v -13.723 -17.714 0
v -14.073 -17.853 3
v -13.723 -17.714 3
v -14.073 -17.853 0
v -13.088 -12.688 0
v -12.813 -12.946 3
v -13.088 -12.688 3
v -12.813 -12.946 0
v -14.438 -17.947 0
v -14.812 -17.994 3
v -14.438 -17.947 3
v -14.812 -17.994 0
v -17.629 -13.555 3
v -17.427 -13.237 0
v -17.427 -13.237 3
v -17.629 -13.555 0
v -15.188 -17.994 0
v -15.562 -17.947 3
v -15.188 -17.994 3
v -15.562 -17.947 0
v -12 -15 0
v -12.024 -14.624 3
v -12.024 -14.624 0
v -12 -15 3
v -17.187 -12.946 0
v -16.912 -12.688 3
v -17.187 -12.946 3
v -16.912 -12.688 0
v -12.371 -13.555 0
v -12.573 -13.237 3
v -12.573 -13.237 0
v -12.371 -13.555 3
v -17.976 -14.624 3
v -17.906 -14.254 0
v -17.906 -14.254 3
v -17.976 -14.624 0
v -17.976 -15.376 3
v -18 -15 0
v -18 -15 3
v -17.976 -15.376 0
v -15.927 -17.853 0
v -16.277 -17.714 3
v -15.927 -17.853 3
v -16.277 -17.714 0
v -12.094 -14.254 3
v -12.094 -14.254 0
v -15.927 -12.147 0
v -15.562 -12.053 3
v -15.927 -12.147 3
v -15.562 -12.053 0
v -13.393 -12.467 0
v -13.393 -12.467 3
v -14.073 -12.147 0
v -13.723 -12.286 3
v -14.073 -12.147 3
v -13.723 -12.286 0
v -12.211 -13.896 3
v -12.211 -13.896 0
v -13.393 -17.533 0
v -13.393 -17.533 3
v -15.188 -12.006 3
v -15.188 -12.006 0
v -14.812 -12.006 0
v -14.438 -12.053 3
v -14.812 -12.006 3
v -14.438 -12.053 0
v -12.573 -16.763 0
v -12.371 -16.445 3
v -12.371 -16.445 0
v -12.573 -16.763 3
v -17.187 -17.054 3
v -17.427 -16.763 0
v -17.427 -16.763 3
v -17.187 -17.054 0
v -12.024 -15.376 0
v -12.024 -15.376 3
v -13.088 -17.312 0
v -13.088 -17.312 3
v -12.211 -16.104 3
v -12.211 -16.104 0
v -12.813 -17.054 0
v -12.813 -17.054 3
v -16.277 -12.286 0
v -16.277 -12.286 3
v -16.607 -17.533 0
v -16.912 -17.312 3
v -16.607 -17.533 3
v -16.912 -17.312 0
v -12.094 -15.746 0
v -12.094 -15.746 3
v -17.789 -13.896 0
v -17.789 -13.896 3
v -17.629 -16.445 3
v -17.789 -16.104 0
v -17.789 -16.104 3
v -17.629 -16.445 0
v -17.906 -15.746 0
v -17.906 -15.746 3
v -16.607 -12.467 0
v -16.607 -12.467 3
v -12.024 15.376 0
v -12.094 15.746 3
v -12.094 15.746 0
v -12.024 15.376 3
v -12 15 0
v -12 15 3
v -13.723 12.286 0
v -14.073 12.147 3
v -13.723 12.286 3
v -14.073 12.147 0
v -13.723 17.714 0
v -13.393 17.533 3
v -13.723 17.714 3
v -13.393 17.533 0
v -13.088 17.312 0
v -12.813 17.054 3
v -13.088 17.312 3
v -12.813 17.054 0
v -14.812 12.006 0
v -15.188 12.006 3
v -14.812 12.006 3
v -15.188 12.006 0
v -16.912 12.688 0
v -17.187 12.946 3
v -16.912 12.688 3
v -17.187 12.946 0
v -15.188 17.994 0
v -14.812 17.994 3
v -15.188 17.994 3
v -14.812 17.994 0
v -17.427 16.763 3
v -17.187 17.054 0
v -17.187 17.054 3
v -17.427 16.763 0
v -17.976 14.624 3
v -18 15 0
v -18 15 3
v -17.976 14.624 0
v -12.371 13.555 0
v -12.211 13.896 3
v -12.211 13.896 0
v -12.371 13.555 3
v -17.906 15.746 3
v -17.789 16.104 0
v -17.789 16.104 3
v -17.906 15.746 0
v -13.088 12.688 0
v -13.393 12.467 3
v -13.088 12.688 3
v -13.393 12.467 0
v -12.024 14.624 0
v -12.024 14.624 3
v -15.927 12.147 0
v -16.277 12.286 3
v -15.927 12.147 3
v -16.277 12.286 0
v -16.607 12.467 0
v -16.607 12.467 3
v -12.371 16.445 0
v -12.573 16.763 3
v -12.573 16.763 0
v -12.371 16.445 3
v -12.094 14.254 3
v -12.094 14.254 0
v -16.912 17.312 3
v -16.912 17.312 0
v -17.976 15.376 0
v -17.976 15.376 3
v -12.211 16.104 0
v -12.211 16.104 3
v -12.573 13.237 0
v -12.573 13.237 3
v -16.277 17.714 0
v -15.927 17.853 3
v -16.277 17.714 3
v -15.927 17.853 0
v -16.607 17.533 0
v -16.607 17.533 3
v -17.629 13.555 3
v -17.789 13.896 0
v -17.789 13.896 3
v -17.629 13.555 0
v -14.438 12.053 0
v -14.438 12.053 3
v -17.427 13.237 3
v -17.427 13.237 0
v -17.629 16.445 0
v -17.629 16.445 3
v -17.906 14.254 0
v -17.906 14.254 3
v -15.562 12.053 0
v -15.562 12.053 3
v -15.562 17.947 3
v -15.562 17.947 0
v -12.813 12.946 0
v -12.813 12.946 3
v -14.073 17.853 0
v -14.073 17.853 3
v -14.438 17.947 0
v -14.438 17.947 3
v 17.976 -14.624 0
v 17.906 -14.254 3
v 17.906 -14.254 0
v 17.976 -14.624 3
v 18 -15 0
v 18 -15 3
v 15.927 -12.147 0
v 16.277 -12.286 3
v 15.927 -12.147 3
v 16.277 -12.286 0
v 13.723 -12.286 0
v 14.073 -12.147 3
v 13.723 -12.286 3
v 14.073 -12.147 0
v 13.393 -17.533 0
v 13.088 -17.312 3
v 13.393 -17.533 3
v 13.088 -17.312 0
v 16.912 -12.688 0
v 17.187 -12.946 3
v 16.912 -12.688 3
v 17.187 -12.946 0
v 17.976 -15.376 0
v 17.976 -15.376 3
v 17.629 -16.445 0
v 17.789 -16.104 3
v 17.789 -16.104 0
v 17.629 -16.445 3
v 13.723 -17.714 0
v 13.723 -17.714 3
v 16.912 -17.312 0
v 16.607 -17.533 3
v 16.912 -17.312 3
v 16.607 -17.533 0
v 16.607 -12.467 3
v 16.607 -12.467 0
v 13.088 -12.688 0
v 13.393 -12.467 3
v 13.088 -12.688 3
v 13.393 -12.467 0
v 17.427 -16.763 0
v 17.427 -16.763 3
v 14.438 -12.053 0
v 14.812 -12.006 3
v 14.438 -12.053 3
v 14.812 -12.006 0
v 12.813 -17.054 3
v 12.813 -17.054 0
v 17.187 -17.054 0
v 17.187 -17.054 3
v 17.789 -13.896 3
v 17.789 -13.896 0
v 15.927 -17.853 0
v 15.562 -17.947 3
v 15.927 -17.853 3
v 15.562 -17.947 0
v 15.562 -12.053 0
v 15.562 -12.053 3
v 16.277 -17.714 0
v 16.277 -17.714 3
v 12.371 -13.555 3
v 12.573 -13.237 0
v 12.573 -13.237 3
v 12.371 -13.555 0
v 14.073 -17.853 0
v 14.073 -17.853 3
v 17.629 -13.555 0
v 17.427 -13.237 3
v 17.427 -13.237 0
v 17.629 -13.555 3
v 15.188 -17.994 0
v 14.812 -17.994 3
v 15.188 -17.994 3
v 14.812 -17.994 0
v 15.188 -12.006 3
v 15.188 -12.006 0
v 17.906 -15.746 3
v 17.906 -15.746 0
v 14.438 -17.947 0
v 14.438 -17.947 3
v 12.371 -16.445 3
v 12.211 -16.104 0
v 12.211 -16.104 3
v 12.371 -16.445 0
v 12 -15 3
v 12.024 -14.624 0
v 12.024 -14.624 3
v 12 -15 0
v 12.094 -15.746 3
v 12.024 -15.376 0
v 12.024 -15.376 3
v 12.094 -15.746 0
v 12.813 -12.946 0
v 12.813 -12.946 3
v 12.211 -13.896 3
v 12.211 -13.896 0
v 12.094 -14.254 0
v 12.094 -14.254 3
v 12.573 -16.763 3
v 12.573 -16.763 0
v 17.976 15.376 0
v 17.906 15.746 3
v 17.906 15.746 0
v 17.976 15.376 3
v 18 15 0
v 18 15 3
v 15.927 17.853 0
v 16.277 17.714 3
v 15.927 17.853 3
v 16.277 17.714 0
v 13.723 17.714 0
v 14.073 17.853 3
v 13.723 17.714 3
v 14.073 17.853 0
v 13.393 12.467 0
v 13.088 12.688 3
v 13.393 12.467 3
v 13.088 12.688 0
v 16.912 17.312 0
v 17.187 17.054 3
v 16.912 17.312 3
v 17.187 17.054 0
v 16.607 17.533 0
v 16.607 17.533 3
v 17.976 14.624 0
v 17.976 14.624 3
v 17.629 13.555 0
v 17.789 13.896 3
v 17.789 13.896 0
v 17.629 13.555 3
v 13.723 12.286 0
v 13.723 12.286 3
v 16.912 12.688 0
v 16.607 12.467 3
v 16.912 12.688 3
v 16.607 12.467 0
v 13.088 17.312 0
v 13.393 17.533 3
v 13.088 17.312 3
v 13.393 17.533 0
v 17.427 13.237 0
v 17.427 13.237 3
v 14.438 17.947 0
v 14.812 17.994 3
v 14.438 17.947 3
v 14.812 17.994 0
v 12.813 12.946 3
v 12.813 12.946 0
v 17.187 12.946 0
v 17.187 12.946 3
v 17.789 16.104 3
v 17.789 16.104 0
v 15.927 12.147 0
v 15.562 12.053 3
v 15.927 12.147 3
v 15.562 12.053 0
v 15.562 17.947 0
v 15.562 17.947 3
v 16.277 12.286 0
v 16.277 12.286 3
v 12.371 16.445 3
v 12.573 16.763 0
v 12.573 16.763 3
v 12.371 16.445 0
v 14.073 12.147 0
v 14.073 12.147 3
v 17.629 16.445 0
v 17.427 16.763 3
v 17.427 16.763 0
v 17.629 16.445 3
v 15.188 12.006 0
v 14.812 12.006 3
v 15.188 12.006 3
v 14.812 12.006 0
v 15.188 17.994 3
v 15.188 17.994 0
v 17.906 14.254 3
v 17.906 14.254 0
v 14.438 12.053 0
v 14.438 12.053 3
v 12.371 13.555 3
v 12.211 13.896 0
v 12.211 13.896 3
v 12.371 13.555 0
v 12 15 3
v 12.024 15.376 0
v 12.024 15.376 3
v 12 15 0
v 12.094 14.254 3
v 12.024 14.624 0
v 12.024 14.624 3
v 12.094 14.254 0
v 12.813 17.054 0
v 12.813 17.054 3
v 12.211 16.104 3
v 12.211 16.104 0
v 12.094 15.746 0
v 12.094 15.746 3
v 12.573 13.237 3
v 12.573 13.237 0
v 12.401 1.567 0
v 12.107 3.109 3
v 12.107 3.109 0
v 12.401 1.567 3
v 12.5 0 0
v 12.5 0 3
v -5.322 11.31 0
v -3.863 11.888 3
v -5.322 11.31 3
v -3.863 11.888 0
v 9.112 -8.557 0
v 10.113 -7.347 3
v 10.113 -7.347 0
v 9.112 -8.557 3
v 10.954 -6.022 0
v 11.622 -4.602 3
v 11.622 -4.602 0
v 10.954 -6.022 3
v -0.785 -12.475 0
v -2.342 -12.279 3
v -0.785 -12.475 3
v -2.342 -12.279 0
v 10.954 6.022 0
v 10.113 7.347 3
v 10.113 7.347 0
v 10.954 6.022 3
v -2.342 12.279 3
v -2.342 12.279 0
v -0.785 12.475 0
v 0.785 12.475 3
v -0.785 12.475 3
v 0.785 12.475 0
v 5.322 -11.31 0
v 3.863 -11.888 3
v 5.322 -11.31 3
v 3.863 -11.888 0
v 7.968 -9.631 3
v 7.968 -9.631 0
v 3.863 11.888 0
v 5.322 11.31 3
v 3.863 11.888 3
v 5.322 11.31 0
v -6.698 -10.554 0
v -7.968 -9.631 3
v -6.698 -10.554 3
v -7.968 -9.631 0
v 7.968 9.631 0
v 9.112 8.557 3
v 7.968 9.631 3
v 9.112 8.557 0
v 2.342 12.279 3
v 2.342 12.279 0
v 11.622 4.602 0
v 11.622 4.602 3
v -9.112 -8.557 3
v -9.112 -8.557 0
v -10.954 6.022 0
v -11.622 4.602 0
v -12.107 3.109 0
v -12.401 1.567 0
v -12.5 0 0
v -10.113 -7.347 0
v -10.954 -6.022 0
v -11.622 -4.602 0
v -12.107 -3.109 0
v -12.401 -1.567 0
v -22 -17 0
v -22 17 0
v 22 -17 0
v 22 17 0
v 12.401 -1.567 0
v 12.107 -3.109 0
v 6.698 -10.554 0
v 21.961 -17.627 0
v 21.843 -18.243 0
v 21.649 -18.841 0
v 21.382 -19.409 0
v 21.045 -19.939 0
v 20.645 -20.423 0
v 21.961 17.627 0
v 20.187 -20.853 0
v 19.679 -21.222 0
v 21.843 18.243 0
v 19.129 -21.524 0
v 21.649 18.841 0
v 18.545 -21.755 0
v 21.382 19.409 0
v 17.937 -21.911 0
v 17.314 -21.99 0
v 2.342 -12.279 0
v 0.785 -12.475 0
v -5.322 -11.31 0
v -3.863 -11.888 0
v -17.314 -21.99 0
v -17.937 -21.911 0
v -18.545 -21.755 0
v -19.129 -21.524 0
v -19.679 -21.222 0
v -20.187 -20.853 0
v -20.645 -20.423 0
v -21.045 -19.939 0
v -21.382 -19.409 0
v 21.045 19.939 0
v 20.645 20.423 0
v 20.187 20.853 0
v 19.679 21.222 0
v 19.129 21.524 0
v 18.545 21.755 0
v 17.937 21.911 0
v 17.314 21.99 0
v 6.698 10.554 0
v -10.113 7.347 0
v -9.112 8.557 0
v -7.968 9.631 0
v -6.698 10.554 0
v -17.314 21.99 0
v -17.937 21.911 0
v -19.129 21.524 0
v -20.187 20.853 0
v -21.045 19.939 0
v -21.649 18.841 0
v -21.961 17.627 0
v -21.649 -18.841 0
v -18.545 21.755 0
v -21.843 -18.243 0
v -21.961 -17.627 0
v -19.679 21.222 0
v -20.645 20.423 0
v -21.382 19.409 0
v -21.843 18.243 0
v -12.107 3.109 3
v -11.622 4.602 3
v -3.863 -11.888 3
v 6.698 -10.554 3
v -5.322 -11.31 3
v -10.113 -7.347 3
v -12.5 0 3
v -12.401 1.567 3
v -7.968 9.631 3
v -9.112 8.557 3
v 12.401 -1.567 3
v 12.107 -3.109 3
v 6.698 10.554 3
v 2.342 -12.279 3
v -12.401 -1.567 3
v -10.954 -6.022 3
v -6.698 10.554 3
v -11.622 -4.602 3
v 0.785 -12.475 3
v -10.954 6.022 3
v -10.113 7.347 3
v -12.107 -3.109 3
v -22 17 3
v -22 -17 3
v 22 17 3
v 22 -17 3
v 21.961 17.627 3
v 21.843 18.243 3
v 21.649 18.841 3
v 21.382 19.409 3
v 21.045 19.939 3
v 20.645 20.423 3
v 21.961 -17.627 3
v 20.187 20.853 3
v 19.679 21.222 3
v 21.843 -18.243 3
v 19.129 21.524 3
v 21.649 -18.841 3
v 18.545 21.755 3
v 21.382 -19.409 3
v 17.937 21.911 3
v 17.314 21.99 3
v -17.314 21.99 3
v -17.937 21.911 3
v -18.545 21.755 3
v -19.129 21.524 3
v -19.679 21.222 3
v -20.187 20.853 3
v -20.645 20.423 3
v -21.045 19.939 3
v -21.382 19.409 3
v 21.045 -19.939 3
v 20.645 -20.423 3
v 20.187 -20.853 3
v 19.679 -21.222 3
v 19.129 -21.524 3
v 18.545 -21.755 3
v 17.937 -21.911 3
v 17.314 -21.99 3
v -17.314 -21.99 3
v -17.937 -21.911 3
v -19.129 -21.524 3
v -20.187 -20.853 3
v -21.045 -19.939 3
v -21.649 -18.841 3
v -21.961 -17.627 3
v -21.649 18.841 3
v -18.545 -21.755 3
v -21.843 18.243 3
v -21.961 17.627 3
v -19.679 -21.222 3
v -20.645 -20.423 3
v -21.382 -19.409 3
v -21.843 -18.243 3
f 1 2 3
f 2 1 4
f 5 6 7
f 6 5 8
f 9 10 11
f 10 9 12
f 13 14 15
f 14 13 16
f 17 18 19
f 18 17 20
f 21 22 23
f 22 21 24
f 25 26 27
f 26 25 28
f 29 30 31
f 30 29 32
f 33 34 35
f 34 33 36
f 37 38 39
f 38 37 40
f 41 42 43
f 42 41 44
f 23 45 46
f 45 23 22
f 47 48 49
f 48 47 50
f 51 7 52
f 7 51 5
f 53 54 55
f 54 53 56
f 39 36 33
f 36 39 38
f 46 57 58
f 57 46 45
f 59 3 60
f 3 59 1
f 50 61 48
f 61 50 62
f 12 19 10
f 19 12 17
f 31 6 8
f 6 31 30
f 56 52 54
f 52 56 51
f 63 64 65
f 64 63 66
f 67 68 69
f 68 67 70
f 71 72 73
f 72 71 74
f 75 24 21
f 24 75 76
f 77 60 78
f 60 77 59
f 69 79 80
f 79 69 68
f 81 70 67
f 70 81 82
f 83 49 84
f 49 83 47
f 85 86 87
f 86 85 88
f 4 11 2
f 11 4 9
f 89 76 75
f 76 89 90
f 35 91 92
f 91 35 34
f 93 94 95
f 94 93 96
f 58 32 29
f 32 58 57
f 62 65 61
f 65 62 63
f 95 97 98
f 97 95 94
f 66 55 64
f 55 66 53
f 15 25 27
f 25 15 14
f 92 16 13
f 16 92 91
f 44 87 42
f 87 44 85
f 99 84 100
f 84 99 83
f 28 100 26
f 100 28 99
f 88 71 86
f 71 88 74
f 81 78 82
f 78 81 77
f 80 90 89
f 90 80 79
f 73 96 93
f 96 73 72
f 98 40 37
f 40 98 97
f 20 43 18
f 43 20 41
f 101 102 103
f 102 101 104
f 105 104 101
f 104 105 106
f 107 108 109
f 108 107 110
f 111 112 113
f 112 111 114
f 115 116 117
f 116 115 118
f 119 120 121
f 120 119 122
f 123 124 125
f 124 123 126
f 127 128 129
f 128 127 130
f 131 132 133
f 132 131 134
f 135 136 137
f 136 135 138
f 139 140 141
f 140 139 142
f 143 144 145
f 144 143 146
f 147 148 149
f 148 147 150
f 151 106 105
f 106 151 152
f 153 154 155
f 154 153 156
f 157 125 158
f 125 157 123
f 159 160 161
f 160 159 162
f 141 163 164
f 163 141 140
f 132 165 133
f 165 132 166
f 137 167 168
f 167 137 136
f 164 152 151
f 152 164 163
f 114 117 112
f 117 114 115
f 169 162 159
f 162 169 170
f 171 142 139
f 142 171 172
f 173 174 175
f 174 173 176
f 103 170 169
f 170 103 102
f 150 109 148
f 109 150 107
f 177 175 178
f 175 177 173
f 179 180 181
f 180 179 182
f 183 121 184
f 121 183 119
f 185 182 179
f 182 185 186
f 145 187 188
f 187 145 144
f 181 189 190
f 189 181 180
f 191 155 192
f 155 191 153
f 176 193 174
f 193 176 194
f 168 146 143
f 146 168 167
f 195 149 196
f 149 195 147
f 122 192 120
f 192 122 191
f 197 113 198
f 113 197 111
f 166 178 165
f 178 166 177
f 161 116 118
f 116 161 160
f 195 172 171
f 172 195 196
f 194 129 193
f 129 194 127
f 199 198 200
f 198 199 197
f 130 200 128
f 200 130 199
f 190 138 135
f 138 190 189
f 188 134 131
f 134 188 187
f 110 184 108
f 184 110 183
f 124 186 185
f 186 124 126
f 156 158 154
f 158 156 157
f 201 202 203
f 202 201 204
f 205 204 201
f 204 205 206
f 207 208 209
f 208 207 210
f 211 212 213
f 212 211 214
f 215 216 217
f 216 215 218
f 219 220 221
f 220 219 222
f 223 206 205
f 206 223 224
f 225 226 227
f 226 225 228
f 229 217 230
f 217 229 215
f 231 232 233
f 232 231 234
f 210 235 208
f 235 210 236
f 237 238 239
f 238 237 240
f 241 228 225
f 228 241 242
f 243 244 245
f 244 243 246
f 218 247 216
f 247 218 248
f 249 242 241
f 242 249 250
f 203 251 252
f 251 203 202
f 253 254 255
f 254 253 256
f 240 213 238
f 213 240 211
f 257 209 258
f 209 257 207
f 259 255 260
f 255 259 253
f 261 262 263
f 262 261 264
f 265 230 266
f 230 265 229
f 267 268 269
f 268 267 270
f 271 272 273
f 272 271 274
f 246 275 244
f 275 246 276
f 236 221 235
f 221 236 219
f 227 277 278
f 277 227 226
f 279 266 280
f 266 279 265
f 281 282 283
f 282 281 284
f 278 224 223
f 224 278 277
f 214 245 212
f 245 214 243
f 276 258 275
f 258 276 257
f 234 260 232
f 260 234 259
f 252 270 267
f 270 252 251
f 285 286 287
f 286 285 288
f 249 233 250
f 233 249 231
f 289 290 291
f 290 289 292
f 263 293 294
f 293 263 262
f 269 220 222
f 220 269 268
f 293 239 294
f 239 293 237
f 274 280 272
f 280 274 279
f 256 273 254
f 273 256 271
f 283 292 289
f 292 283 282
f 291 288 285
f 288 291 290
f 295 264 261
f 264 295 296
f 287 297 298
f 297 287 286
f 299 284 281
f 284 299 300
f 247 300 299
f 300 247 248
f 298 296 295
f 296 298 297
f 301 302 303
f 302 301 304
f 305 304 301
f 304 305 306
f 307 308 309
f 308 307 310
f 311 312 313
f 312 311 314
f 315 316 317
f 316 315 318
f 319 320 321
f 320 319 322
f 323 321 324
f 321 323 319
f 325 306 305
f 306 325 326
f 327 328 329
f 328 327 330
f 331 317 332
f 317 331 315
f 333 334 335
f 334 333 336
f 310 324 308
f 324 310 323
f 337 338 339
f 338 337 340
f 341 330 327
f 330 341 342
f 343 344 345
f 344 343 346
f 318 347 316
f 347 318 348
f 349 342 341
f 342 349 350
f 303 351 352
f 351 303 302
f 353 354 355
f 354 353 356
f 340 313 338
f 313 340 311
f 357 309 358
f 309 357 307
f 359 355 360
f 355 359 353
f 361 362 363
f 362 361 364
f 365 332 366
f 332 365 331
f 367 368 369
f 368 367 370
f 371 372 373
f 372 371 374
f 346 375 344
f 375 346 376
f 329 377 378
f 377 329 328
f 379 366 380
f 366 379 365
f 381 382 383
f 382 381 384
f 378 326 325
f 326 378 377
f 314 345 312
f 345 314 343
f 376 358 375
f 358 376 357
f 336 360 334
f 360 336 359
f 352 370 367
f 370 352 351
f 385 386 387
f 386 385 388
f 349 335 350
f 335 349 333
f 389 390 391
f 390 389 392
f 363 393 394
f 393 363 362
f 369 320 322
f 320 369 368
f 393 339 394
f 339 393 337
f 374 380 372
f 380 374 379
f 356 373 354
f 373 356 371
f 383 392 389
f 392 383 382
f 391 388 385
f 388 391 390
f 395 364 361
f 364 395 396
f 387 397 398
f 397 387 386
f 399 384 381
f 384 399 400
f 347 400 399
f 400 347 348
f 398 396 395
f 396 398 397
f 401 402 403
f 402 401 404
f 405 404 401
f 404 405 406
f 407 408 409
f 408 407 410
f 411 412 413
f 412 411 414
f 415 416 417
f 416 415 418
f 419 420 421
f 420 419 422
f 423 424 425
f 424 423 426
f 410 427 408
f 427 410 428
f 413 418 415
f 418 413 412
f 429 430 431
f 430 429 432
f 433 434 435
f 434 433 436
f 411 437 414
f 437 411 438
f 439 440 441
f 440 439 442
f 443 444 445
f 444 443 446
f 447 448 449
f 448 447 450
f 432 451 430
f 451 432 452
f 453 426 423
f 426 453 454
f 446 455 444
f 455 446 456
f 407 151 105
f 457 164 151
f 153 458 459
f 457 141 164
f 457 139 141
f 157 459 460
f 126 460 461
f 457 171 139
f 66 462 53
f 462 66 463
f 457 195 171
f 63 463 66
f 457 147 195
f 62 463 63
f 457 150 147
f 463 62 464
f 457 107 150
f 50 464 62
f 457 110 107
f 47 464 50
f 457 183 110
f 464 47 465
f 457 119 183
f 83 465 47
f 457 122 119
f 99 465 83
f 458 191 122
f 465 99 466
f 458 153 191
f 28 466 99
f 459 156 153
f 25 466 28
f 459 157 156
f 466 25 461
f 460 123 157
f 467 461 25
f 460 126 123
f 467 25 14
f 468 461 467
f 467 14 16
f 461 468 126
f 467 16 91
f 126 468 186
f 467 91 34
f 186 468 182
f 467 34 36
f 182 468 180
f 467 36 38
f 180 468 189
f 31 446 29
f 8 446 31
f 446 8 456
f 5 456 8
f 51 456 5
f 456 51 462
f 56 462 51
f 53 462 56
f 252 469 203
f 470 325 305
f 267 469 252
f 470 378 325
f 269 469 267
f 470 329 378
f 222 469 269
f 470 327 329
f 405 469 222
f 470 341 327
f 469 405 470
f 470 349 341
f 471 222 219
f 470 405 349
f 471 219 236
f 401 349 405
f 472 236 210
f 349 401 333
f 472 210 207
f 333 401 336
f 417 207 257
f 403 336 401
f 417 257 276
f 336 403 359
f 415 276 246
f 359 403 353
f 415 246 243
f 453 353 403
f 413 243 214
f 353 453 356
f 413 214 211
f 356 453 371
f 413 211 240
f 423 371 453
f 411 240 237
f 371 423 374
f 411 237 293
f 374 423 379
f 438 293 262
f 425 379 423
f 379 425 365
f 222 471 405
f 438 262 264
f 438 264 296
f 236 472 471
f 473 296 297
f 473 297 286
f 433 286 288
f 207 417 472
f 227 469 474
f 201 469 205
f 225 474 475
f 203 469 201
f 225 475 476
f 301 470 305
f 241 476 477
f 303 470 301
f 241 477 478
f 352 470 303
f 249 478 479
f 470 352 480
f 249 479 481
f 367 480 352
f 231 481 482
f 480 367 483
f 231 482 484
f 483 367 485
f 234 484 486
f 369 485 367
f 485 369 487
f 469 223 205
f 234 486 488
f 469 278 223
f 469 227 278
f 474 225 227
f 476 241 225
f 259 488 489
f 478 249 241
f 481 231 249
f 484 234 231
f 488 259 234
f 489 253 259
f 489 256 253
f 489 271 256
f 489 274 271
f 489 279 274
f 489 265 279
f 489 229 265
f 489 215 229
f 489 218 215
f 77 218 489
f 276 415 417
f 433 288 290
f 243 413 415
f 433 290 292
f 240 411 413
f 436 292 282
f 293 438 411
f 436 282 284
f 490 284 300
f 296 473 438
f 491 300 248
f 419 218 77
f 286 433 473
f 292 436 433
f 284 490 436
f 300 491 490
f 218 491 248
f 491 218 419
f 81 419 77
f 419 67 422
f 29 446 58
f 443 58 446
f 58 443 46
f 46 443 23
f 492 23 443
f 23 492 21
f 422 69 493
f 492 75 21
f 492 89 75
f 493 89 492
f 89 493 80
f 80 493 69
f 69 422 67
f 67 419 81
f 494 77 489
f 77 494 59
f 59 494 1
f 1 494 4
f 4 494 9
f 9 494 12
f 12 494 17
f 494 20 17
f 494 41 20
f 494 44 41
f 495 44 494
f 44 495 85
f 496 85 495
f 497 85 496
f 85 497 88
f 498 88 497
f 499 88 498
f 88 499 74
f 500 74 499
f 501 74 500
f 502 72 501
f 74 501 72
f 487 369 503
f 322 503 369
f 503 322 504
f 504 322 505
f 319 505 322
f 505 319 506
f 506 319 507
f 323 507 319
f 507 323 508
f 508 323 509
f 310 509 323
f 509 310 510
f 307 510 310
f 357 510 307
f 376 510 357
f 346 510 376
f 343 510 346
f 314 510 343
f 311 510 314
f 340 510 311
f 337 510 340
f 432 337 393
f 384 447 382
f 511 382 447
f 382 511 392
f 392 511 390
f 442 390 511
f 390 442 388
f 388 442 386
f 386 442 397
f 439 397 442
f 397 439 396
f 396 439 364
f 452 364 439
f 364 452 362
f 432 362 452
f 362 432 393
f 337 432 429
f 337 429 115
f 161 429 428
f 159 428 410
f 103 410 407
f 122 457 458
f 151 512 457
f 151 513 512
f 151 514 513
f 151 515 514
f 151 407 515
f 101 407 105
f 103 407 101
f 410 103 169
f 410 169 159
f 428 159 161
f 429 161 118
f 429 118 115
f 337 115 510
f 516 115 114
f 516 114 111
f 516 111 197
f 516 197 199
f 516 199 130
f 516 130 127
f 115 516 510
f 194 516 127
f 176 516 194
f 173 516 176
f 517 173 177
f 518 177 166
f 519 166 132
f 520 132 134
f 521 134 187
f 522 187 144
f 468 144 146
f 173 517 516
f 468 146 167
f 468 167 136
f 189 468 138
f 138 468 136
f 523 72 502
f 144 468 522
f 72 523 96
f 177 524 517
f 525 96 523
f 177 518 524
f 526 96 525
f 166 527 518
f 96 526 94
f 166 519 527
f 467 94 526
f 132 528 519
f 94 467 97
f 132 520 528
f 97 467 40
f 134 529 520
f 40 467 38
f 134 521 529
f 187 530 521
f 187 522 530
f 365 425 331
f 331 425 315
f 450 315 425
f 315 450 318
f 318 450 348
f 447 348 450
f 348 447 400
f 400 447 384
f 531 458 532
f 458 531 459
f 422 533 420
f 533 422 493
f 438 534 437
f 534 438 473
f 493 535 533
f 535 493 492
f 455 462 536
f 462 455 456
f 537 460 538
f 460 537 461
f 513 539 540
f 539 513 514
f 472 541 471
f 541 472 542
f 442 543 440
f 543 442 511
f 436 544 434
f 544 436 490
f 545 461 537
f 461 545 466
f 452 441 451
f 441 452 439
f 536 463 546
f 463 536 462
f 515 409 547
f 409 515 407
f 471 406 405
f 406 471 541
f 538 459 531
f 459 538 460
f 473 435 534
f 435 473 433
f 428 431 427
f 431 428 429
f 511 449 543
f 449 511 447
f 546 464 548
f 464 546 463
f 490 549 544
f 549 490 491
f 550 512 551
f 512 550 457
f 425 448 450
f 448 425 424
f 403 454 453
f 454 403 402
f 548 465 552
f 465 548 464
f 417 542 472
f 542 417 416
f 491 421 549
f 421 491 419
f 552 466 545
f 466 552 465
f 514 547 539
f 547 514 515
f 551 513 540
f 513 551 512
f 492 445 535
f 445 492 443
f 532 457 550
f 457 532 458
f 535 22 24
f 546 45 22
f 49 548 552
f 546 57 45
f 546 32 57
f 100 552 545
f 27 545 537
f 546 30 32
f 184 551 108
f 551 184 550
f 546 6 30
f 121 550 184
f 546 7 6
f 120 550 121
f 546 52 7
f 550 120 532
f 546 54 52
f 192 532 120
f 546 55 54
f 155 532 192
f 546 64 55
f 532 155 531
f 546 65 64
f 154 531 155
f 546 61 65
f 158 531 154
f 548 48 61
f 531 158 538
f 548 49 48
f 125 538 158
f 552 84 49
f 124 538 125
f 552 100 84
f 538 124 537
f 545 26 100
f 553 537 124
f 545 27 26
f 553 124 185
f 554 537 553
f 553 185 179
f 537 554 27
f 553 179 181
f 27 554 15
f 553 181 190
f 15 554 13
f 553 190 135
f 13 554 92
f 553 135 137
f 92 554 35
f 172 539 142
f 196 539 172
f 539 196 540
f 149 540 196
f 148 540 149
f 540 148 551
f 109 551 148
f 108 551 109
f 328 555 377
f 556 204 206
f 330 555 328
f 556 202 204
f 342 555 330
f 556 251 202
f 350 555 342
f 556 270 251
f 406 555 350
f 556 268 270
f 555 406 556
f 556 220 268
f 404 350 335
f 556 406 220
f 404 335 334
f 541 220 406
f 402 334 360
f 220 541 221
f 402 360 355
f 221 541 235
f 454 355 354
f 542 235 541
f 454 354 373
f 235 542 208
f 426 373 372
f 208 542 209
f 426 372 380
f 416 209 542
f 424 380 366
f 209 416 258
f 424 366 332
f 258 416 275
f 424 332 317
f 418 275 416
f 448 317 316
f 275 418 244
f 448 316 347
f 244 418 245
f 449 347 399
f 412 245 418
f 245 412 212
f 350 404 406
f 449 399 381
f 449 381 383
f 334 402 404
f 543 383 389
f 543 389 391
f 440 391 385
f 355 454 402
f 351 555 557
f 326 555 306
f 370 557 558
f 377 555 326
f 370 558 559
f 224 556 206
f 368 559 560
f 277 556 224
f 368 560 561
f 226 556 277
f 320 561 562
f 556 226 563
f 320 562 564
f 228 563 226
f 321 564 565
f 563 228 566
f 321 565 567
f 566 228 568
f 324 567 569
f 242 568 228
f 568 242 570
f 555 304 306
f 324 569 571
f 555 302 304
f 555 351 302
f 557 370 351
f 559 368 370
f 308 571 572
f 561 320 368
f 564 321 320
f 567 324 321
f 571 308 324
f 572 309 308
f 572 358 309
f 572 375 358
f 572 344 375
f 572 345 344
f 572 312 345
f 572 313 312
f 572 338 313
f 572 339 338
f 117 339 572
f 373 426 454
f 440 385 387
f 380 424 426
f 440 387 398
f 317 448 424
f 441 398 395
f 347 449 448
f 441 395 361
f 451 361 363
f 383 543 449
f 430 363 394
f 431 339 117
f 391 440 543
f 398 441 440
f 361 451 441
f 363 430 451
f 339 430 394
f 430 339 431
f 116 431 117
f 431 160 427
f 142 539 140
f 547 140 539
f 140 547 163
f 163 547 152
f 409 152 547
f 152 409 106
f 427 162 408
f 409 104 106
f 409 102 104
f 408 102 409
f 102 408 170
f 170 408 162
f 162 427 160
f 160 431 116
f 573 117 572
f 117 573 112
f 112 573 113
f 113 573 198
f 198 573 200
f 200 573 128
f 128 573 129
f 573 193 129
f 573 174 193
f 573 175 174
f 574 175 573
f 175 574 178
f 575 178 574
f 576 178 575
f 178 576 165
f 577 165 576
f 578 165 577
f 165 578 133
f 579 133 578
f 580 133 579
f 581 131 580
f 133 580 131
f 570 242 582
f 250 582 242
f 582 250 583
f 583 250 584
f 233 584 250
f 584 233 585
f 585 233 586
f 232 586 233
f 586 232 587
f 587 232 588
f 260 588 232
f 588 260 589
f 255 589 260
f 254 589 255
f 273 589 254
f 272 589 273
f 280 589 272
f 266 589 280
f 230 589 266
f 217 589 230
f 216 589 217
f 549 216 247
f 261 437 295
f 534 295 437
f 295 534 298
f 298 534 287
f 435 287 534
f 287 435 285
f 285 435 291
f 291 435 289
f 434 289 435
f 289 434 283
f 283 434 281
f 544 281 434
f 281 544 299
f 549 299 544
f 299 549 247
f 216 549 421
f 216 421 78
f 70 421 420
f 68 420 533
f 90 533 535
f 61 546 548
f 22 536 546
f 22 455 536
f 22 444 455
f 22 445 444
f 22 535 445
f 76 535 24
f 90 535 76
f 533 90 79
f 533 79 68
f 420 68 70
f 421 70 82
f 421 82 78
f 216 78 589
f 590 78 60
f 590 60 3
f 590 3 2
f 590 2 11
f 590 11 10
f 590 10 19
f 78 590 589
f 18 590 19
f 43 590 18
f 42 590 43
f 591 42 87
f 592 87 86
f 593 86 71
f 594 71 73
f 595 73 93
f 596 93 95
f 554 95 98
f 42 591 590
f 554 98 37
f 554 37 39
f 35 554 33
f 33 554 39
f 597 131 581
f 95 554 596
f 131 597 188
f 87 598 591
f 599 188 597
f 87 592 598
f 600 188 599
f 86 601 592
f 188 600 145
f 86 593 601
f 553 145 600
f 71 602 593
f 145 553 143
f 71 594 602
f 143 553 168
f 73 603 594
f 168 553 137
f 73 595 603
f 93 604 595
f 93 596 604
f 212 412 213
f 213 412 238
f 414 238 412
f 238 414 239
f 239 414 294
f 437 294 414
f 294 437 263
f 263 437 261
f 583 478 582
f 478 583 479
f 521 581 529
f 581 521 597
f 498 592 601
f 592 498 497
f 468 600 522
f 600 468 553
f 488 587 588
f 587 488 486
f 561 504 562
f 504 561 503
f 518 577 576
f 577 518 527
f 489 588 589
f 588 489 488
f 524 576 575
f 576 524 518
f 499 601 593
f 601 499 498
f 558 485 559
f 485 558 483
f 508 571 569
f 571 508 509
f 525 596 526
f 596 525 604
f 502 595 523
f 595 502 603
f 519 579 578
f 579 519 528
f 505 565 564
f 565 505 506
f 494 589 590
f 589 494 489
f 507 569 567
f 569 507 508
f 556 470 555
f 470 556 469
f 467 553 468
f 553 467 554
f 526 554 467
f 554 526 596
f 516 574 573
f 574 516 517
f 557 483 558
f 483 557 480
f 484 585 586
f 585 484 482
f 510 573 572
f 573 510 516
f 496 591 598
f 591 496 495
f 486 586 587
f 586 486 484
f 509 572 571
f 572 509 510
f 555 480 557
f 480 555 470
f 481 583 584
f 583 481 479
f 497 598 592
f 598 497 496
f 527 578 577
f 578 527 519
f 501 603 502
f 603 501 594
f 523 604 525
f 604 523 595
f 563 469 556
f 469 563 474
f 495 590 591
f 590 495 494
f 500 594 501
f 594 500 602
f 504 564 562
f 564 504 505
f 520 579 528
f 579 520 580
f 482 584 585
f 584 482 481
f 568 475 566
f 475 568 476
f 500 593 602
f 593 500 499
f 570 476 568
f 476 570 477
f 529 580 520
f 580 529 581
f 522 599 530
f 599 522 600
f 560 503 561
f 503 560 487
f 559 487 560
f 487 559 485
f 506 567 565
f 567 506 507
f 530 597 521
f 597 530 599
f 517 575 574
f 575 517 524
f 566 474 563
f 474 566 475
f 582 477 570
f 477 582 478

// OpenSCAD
$fn = 50;


difference() {
	union() {
		hull() {
			translate(v = [-17.0000000000, 17.0000000000, 0]) {
				cylinder(h = 3, r = 5);
			}
			translate(v = [17.0000000000, 17.0000000000, 0]) {
				cylinder(h = 3, r = 5);
			}
			translate(v = [-17.0000000000, -17.0000000000, 0]) {
				cylinder(h = 3, r = 5);
			}
			translate(v = [17.0000000000, -17.0000000000, 0]) {
				cylinder(h = 3, r = 5);
			}
		}
	}
	union() {
		#translate(v = [-15.0000000000, -15.0000000000, -100.0000000000]) {
			cylinder(h = 200, r = 3.0000000000);
		}
		#translate(v = [-15.0000000000, 15.0000000000, -100.0000000000]) {
			cylinder(h = 200, r = 3.0000000000);
		}
		#translate(v = [15.0000000000, -15.0000000000, -100.0000000000]) {
			cylinder(h = 200, r = 3.0000000000);
		}
		#translate(v = [15.0000000000, 15.0000000000, -100.0000000000]) {
			cylinder(h = 200, r = 3.0000000000);
		}
		#cylinder(h = 3, r = 12.5000000000);
	}
}
